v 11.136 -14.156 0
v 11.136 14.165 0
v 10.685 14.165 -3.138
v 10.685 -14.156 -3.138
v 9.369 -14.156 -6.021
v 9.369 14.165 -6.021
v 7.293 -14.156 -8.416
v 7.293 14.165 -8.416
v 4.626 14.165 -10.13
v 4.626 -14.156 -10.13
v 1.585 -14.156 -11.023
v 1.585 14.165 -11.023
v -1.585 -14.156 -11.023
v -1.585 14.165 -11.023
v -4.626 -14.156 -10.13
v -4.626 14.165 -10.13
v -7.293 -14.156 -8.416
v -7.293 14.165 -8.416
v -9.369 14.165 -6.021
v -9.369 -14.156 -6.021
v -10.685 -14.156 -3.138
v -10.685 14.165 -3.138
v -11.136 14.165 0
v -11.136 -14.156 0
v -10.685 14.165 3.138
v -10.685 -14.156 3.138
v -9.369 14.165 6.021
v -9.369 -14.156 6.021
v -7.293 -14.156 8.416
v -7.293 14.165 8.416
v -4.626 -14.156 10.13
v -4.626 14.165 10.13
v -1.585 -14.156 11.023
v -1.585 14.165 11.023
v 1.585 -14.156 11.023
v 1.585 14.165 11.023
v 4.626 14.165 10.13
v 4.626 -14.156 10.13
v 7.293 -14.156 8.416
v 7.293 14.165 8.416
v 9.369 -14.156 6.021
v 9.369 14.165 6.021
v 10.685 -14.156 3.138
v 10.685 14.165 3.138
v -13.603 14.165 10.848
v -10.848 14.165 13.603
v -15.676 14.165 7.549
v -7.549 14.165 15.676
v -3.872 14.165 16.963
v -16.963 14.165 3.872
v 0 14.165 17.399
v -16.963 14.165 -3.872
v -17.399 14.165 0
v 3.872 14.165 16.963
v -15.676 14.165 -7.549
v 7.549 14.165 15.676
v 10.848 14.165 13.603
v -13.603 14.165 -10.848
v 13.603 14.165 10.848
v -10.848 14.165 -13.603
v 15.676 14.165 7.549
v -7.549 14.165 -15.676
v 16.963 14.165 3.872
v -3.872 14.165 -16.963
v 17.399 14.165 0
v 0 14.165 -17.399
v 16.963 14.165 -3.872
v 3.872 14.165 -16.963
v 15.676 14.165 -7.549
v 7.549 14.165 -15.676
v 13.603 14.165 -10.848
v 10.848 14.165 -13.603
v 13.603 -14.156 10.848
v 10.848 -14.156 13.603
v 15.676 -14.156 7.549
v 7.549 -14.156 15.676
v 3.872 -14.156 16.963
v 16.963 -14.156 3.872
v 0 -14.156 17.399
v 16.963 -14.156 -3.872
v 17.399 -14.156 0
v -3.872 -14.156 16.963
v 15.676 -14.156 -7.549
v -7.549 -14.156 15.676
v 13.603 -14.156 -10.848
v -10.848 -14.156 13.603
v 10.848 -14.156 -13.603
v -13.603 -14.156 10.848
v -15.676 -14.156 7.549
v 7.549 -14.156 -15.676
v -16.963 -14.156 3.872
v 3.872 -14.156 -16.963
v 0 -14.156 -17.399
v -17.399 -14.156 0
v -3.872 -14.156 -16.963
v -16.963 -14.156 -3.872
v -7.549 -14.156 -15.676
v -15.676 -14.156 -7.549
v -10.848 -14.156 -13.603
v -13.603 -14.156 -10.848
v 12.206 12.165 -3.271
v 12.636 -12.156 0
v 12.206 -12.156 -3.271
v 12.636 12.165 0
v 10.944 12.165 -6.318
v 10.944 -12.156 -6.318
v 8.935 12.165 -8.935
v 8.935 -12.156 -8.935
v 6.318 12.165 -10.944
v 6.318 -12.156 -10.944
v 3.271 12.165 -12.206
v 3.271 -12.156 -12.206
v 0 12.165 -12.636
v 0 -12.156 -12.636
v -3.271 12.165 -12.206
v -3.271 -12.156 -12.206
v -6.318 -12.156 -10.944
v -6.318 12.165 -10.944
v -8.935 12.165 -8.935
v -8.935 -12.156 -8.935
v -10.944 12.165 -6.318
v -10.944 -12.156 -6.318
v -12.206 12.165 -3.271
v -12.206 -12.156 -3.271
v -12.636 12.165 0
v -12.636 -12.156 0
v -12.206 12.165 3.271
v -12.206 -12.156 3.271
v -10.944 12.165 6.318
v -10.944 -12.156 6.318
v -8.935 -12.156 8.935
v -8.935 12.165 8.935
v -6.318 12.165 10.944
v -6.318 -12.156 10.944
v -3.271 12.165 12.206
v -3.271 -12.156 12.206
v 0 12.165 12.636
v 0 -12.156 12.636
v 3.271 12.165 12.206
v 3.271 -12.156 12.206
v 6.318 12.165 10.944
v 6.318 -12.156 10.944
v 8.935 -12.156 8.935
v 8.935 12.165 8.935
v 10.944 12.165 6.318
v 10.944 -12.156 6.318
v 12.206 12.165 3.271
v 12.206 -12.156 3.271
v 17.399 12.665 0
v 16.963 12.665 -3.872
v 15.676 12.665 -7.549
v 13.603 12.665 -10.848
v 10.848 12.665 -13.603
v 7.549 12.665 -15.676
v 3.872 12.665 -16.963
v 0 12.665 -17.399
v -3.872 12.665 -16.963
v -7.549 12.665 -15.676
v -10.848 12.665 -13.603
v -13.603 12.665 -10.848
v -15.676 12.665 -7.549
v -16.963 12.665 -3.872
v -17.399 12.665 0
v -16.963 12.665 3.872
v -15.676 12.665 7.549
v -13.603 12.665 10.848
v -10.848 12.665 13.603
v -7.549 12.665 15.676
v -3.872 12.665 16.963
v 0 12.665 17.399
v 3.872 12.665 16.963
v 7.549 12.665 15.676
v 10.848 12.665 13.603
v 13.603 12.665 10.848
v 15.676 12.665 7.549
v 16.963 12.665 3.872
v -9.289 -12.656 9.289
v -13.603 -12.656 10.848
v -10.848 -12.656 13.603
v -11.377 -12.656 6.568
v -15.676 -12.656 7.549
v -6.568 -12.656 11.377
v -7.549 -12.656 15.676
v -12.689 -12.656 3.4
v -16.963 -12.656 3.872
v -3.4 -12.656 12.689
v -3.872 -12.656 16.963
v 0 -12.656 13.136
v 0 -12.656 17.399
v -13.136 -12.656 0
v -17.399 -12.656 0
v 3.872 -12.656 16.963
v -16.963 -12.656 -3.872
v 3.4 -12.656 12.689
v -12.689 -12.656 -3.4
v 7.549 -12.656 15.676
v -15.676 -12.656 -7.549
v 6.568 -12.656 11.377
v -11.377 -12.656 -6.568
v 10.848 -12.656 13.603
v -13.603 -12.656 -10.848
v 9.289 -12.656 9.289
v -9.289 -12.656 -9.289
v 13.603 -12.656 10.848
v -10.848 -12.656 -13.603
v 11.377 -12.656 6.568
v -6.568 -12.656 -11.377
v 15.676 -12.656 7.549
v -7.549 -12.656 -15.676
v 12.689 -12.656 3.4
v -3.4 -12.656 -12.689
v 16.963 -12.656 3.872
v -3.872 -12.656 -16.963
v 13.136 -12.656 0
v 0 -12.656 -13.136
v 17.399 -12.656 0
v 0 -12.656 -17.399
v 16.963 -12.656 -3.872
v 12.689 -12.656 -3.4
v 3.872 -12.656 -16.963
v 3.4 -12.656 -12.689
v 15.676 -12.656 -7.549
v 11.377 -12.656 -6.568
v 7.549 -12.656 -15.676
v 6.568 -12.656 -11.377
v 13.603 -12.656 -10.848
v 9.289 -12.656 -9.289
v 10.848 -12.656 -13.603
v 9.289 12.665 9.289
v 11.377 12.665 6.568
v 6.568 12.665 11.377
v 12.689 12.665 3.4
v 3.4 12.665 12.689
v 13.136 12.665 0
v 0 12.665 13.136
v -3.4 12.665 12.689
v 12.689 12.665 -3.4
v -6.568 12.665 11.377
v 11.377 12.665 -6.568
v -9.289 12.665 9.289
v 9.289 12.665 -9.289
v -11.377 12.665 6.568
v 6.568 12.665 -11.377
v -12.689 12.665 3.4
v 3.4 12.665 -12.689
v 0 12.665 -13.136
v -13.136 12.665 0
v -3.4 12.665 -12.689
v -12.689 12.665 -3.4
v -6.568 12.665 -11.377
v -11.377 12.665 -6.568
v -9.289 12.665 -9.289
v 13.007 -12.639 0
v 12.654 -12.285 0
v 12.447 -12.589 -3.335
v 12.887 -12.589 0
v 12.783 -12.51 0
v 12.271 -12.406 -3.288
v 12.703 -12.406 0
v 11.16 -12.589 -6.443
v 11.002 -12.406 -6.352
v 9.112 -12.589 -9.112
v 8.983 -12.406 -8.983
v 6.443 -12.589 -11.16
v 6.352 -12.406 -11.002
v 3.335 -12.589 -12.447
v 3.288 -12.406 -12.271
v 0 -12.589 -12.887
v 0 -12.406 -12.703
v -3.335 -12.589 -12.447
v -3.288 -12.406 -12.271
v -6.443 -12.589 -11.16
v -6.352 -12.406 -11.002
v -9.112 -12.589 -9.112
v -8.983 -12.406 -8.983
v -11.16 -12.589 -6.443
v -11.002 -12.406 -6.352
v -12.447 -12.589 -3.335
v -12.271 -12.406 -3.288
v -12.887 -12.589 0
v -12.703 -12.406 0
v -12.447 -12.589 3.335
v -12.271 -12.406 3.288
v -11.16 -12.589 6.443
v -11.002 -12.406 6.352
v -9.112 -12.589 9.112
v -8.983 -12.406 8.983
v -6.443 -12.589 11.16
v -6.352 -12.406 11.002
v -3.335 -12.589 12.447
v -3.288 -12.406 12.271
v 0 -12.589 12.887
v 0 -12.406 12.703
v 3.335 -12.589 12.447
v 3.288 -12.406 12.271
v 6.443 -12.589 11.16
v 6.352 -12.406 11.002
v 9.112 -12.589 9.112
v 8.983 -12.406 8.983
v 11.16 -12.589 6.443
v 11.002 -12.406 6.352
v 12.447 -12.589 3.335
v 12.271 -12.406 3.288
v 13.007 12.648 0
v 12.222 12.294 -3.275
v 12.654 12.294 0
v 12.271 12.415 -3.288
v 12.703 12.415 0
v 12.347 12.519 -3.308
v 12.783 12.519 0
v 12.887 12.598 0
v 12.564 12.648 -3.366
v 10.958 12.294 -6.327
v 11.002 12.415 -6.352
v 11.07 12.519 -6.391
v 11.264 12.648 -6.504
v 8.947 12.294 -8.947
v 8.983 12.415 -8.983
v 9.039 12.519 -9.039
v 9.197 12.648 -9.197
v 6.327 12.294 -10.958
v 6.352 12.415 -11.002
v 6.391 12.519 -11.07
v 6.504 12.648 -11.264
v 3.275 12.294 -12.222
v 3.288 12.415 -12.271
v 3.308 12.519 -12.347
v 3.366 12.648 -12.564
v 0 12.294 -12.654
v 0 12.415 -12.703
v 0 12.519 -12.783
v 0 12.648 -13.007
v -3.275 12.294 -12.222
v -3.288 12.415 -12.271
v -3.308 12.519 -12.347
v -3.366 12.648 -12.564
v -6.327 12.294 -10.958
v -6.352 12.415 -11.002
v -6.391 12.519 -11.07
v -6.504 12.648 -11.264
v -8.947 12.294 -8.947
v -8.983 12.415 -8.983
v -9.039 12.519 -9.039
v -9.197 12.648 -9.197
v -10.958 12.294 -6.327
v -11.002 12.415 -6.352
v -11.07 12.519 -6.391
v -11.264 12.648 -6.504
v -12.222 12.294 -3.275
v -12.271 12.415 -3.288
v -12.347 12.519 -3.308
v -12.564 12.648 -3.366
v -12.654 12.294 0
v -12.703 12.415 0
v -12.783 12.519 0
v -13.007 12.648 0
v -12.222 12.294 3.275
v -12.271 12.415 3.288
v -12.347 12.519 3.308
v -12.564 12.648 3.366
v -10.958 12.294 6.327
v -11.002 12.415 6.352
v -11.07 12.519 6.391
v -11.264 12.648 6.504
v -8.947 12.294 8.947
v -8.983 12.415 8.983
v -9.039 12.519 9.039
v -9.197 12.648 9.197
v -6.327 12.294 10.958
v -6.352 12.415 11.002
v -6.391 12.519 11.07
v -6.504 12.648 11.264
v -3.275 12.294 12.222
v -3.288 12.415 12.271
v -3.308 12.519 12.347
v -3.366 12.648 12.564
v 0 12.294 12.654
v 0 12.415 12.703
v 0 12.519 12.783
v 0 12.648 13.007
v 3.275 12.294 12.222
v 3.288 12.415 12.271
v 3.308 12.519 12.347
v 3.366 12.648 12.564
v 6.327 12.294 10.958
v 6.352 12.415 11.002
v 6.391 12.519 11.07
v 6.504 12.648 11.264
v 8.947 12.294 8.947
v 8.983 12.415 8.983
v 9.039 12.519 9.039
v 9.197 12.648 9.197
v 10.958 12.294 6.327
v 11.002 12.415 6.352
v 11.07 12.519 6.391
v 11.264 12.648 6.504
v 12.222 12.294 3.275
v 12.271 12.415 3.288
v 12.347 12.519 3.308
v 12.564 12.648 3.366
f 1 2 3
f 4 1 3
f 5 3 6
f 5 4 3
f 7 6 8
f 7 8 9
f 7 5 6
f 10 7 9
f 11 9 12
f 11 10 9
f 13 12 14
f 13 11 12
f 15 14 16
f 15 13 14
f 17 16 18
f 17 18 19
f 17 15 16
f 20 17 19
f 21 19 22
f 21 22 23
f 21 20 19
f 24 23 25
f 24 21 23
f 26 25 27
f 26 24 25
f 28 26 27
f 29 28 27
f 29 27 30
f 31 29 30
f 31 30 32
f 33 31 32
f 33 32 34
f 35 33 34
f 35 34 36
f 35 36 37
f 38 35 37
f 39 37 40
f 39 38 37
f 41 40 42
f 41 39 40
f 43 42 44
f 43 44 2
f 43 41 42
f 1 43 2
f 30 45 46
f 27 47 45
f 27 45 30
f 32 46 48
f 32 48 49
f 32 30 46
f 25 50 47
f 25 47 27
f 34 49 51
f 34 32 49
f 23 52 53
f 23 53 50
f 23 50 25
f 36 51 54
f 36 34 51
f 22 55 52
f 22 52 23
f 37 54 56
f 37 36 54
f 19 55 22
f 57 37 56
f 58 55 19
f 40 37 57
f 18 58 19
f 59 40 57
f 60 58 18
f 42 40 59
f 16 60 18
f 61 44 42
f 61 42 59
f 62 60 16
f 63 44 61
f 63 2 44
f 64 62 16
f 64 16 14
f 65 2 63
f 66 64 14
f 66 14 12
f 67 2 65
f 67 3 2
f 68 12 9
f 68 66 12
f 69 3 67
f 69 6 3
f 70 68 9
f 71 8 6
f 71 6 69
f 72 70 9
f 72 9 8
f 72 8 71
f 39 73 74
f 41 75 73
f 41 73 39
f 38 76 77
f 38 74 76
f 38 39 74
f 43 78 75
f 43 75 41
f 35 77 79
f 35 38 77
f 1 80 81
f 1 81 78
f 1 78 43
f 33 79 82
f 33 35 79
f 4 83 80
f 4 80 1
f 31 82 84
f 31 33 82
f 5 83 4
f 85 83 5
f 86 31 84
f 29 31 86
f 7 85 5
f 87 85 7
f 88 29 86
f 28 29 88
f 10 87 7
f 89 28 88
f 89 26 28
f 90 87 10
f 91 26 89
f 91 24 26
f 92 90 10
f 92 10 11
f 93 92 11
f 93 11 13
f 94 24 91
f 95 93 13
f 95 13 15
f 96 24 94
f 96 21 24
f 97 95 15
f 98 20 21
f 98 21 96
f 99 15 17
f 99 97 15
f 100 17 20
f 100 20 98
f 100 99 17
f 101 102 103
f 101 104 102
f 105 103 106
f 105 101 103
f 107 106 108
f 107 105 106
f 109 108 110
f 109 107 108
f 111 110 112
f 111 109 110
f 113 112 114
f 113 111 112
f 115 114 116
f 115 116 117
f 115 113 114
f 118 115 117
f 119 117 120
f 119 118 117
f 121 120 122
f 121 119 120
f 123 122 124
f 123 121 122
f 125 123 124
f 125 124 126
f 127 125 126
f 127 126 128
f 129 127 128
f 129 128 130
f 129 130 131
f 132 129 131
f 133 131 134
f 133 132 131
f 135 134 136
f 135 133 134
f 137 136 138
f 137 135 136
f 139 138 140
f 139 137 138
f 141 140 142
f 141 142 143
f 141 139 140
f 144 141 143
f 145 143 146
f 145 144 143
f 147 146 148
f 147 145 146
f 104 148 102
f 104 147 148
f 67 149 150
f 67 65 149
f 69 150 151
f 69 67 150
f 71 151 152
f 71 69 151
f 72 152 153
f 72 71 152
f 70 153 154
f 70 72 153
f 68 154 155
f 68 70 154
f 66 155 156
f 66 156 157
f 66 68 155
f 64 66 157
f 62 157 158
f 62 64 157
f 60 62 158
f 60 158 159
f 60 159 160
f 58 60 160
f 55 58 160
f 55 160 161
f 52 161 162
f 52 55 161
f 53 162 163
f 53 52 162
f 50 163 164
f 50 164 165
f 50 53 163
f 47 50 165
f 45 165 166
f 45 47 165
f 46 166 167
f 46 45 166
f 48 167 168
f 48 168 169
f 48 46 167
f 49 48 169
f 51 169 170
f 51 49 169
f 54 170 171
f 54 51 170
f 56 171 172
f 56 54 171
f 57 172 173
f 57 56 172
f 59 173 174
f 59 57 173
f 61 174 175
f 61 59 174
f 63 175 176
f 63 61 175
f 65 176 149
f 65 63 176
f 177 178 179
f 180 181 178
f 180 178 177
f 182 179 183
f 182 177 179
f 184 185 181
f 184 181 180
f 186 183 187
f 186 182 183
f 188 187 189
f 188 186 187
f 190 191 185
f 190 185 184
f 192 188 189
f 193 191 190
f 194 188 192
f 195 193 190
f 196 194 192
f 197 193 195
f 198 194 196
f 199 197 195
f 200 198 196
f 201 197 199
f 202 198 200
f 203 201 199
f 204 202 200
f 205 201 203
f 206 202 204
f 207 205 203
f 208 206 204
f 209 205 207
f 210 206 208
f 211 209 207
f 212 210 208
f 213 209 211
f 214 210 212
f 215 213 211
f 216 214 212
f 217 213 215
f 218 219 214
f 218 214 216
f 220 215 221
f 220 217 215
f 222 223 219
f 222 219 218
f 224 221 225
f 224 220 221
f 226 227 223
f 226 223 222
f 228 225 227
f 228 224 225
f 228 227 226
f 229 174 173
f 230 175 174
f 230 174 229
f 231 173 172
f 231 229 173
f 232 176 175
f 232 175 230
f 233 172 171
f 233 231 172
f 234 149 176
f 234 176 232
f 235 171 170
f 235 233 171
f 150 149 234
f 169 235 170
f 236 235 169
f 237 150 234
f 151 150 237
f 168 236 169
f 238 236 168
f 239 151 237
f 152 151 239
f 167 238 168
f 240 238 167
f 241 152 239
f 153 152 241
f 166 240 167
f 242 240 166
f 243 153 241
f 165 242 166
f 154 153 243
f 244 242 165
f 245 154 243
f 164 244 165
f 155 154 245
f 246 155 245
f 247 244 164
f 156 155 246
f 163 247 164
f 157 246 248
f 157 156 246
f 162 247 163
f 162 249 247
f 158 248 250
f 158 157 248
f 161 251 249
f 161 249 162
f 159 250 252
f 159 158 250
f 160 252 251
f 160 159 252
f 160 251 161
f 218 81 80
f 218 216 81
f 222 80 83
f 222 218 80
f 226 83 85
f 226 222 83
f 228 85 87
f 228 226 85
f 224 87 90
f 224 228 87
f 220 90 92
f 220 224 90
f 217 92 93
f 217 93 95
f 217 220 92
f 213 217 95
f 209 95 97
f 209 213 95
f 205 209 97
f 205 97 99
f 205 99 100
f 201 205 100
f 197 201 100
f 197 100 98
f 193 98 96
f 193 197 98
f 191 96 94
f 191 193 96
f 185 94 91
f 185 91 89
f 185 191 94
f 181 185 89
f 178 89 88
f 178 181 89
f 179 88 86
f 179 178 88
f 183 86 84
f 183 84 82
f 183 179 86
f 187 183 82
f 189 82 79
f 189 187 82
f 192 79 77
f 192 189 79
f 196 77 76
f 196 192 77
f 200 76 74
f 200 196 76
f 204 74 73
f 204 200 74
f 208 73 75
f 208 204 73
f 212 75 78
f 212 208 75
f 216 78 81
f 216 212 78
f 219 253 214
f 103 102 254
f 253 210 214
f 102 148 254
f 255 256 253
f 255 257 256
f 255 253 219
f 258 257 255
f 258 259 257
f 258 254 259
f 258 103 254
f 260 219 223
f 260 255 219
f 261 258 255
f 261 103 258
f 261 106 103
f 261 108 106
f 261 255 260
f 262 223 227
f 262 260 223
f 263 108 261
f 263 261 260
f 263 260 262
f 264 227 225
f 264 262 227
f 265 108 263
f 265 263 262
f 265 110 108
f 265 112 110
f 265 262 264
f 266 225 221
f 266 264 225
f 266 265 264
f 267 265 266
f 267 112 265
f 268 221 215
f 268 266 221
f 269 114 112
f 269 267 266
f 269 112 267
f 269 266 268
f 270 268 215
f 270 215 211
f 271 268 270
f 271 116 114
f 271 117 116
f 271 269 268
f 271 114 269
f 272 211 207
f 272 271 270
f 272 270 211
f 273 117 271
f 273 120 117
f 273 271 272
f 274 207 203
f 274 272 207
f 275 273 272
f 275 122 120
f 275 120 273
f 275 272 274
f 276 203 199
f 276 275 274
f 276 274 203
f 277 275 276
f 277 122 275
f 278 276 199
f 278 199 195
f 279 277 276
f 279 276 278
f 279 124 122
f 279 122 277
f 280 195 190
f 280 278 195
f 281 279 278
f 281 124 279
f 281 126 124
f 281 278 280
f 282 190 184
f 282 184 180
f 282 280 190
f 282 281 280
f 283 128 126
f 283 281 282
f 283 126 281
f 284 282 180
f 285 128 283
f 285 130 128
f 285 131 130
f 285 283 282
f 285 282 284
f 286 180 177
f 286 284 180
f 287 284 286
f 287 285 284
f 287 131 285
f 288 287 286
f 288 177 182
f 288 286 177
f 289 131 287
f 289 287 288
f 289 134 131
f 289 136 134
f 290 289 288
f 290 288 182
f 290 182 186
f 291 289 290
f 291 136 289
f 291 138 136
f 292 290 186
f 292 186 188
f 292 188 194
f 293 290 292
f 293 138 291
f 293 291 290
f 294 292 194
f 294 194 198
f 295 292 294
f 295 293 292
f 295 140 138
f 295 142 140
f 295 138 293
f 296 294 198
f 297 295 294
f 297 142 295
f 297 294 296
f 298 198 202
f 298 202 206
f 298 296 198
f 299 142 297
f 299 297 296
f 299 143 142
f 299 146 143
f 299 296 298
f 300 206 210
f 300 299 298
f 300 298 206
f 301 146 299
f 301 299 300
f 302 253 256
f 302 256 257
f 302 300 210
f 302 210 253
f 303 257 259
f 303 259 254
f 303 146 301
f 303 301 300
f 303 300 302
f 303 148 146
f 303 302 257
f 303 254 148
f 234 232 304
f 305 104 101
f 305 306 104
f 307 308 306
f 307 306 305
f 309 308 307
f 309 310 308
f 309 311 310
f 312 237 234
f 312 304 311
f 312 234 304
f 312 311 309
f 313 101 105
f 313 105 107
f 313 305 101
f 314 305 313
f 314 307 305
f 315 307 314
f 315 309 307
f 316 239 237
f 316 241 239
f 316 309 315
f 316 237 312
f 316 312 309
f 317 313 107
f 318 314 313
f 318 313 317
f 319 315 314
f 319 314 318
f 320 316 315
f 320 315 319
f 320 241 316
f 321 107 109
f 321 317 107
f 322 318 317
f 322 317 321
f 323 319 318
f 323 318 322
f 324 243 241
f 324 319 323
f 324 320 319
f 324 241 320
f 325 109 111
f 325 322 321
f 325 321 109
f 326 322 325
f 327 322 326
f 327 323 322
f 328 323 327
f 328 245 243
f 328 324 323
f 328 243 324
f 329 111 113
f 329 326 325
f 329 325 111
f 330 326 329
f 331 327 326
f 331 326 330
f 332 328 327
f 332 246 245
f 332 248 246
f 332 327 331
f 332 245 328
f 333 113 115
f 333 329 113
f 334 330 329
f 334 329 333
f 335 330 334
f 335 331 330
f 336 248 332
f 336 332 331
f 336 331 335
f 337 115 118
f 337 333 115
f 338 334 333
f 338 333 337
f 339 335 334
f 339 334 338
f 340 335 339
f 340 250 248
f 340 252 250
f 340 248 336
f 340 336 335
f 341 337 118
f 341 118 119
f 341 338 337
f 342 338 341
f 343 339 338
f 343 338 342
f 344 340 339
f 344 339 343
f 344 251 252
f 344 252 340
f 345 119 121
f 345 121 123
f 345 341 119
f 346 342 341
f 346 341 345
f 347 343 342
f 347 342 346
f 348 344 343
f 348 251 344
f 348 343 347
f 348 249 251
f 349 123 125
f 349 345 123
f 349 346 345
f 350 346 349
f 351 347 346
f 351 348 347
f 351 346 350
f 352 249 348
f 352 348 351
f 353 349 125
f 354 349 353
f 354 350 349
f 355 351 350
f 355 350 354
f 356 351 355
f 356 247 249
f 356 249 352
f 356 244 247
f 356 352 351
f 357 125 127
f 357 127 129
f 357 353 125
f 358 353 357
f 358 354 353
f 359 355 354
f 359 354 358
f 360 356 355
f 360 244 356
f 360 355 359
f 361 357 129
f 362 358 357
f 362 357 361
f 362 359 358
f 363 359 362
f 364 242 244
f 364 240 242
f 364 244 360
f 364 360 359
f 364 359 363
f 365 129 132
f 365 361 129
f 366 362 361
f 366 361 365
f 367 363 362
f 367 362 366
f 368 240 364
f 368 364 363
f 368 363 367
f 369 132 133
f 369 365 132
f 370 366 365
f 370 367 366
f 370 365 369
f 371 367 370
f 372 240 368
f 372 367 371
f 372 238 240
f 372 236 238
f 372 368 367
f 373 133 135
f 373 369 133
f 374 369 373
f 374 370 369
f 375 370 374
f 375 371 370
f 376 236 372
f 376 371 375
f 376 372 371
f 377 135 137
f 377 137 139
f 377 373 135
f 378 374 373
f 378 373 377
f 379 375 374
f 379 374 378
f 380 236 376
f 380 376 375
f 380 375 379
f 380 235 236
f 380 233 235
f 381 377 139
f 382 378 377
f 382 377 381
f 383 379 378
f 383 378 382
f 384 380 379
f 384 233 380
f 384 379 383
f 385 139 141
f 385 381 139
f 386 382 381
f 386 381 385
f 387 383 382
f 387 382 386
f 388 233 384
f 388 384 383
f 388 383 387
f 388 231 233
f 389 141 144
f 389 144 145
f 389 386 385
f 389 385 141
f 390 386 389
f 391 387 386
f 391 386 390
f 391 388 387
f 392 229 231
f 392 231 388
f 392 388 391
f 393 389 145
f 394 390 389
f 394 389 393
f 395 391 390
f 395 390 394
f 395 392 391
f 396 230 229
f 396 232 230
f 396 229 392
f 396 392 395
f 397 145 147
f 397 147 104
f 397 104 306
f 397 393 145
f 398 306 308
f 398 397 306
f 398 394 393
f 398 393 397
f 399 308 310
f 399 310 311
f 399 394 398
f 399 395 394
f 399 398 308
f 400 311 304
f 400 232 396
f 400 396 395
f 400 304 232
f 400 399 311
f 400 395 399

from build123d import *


with BuildPart() as f1:
    # F0 (on Top) → F1 (revolve)
    with BuildSketch(Plane.XY):
        with BuildLine():
            Line((13.1365, 12.665), (17.399, 12.665))
            Line((17.399, 12.665), (17.399, 14.165))
            Line((17.399, 14.165), (11.1365, 14.165))
            Line((11.1365, 14.165), (11.1365, -14.156))
            Line((11.1365, -14.156), (17.399, -14.156))
            Line((17.399, -14.156), (17.399, -12.656))
            Line((17.399, -12.656), (13.1365, -12.656))
            ThreePointArc((13.1365, -12.656), (12.782947, -12.509553), (12.6365, -12.156))
            Line((12.6365, -12.156), (12.6365, 12.165))
            ThreePointArc((12.6365, 12.165), (12.782947, 12.518553), (13.1365, 12.665))
        make_face()
    revolve(axis=Axis((0, 2.854013, 0), (0, 1, 0)))


solid = f1.part
